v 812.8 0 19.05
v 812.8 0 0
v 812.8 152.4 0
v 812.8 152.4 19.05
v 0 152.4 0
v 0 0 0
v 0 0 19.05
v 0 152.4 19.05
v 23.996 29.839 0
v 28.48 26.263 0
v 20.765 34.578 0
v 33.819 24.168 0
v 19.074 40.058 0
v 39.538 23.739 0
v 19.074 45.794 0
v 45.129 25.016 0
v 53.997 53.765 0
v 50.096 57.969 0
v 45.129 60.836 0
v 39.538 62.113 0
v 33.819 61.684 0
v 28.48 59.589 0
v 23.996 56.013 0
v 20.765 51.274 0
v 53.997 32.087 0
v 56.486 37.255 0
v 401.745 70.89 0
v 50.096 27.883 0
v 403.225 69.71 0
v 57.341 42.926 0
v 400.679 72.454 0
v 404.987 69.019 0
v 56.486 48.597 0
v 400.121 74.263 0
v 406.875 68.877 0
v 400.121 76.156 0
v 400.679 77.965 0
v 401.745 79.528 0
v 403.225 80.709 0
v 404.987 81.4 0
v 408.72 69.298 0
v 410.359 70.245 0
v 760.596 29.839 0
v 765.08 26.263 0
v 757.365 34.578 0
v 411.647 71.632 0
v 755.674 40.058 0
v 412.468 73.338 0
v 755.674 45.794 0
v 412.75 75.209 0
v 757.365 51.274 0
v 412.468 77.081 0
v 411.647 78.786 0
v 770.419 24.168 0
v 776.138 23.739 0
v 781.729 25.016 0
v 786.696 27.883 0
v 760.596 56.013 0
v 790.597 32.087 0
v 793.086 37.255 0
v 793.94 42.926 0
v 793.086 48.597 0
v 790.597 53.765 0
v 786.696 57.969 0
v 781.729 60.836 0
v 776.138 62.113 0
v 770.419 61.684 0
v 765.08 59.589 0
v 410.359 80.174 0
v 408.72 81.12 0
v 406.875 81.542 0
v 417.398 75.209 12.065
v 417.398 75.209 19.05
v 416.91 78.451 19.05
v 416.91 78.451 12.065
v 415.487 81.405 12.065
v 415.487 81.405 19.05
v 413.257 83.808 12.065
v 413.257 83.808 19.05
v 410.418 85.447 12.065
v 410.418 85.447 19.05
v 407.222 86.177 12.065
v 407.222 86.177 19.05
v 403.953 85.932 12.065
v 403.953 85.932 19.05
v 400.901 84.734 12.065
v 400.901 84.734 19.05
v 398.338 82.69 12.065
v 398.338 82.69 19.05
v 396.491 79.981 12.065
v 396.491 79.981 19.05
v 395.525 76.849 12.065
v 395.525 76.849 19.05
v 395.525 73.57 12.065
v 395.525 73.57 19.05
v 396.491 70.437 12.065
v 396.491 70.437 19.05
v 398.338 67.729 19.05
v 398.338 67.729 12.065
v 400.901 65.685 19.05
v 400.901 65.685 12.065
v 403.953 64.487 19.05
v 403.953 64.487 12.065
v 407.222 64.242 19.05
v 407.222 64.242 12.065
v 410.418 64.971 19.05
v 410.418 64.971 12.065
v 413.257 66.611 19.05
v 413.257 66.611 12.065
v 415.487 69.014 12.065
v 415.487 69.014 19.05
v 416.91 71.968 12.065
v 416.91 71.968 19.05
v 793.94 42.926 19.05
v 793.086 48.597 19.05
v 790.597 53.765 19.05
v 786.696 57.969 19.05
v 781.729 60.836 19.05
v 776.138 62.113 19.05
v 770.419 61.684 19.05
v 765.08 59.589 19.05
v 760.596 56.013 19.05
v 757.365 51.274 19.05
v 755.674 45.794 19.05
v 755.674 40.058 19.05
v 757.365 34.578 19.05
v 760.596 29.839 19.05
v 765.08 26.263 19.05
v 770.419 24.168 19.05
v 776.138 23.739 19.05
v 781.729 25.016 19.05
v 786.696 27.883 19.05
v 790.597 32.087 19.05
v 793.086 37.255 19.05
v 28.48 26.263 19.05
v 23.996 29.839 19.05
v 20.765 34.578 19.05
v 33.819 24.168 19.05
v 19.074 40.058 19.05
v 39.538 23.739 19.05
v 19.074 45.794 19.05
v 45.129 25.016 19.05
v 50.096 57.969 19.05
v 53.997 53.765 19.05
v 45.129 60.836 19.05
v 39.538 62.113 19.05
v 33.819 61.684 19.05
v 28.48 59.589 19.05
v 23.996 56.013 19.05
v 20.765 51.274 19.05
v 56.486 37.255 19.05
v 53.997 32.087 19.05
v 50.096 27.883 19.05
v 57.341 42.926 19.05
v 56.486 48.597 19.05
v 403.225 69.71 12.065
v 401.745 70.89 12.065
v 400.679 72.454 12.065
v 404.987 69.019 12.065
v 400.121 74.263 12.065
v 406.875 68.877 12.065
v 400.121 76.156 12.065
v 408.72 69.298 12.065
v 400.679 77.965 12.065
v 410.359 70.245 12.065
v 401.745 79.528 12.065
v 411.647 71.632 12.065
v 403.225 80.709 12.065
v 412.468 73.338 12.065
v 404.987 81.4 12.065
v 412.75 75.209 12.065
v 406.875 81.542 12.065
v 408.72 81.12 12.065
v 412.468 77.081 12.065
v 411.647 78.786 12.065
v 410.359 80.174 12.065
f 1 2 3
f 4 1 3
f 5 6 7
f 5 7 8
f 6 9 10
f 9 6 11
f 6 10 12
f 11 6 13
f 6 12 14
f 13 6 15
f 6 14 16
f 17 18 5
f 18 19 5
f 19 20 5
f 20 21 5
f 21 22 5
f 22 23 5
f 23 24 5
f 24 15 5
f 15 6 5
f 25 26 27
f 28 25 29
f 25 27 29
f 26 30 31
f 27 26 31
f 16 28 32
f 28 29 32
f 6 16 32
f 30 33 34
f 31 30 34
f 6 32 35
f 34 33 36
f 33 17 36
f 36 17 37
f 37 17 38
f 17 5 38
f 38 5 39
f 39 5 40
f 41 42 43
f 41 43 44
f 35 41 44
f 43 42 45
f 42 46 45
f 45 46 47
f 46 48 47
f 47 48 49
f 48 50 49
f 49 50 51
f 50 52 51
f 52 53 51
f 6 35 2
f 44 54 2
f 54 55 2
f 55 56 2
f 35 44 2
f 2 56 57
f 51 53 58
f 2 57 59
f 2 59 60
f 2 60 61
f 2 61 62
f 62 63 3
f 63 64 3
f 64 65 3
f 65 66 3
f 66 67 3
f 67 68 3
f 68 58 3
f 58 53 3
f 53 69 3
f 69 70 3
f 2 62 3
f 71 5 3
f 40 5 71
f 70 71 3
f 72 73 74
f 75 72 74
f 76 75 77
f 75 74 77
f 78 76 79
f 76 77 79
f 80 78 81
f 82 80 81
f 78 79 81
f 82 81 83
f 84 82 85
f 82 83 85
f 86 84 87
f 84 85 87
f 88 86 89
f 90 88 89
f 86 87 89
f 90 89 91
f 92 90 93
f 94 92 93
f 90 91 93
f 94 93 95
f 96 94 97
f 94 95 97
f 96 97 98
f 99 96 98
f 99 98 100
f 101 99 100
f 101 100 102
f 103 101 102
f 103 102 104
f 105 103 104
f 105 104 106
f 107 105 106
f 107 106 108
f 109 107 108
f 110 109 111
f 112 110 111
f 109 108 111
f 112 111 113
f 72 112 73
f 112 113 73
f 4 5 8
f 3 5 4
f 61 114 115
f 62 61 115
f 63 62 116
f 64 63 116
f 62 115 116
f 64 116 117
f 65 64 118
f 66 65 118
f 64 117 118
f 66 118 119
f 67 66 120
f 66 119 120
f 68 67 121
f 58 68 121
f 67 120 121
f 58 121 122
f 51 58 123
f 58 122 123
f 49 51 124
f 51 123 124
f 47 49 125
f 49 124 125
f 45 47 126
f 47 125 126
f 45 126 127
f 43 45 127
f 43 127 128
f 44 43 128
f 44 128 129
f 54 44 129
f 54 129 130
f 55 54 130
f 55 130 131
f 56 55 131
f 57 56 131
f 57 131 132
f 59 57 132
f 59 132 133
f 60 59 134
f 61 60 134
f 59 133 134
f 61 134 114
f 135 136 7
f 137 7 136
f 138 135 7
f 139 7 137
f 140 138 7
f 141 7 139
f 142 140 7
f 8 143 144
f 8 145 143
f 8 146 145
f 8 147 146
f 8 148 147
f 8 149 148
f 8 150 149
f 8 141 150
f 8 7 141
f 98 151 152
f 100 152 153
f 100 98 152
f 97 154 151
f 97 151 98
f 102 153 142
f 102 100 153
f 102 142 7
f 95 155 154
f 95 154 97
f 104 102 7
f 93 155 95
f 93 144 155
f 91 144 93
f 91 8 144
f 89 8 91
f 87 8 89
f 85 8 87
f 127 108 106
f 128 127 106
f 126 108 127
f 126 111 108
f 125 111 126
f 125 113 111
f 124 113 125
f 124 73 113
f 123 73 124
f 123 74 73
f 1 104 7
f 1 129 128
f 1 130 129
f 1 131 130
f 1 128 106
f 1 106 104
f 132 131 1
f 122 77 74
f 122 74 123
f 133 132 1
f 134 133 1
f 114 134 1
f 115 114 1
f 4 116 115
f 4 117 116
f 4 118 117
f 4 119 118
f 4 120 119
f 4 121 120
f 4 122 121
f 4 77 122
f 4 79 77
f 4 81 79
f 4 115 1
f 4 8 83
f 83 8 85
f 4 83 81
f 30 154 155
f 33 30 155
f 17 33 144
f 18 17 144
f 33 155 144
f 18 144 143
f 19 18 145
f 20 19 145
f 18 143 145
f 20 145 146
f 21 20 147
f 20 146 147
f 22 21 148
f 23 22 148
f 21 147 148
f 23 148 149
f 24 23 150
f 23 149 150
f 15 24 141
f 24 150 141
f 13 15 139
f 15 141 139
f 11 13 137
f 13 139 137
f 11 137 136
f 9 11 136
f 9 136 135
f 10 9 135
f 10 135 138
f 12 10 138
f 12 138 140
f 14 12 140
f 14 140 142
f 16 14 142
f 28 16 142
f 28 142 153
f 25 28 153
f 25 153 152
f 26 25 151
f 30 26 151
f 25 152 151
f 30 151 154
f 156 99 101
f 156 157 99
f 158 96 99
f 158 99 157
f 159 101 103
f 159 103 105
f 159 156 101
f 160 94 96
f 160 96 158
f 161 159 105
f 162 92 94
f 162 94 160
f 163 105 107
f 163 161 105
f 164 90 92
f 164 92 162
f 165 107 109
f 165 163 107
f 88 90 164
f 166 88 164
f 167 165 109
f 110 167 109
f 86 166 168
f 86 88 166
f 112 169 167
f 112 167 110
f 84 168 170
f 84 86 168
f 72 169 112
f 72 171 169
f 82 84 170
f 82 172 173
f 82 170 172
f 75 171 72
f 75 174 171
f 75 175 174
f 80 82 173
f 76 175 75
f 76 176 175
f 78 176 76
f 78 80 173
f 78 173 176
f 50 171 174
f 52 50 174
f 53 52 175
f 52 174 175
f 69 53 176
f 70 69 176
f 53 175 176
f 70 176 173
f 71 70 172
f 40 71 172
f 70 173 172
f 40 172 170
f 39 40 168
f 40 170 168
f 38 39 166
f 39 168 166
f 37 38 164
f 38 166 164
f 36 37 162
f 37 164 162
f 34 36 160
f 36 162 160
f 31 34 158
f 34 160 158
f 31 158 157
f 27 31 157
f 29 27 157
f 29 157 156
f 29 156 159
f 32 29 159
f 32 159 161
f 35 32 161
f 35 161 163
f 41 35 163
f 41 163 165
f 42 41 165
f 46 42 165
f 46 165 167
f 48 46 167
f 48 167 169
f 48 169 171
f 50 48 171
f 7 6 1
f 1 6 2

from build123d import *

# Parameters (mm, degrees)
SKETCH1_W           = 812.8
SKETCH1_H           = 152.4
BOSS_EXTRUDE1_DEPTH = 19.05
SKETCH2_R           = 19.2405
CUT_EXTRUDE1_DEPTH  = 19.05
SKETCH3_R           = 10.9982
CUT_EXTRUDE2_DEPTH  = 6.985
SKETCH4_R           = 6.35
CUT_EXTRUDE3_DEPTH  = 828.052092812


with BuildPart() as part:
    # Sketch1 → Boss-Extrude1 (new body)
    with BuildSketch(Plane.XY):
        with Locations((406.4, 76.2)):
            Rectangle(SKETCH1_W, SKETCH1_H)
    extrude(amount=BOSS_EXTRUDE1_DEPTH)

    # Sketch2 → Cut-Extrude1 (cut)
    with BuildSketch(Plane.XY.offset(19.05)):
        with Locations((38.1, 42.926)):
            Circle(SKETCH2_R)
        with Locations((774.7, 42.926)):
            Circle(SKETCH2_R)
    extrude(amount=-CUT_EXTRUDE1_DEPTH, mode=Mode.SUBTRACT)

    # Sketch3 → Cut-Extrude2 (cut)
    with BuildSketch(Plane.XY.offset(19.05)):
        with Locations((406.4, 75.2094)):
            Circle(SKETCH3_R)
    extrude(amount=-CUT_EXTRUDE2_DEPTH, mode=Mode.SUBTRACT)

    # Sketch4 → Cut-Extrude3 (cut, through all)
    with BuildSketch(Plane.XY.offset(12.065)):
        with Locations((406.4, 75.2094)):
            Circle(SKETCH4_R)
    extrude(amount=-CUT_EXTRUDE3_DEPTH, mode=Mode.SUBTRACT)


solid = part.part
